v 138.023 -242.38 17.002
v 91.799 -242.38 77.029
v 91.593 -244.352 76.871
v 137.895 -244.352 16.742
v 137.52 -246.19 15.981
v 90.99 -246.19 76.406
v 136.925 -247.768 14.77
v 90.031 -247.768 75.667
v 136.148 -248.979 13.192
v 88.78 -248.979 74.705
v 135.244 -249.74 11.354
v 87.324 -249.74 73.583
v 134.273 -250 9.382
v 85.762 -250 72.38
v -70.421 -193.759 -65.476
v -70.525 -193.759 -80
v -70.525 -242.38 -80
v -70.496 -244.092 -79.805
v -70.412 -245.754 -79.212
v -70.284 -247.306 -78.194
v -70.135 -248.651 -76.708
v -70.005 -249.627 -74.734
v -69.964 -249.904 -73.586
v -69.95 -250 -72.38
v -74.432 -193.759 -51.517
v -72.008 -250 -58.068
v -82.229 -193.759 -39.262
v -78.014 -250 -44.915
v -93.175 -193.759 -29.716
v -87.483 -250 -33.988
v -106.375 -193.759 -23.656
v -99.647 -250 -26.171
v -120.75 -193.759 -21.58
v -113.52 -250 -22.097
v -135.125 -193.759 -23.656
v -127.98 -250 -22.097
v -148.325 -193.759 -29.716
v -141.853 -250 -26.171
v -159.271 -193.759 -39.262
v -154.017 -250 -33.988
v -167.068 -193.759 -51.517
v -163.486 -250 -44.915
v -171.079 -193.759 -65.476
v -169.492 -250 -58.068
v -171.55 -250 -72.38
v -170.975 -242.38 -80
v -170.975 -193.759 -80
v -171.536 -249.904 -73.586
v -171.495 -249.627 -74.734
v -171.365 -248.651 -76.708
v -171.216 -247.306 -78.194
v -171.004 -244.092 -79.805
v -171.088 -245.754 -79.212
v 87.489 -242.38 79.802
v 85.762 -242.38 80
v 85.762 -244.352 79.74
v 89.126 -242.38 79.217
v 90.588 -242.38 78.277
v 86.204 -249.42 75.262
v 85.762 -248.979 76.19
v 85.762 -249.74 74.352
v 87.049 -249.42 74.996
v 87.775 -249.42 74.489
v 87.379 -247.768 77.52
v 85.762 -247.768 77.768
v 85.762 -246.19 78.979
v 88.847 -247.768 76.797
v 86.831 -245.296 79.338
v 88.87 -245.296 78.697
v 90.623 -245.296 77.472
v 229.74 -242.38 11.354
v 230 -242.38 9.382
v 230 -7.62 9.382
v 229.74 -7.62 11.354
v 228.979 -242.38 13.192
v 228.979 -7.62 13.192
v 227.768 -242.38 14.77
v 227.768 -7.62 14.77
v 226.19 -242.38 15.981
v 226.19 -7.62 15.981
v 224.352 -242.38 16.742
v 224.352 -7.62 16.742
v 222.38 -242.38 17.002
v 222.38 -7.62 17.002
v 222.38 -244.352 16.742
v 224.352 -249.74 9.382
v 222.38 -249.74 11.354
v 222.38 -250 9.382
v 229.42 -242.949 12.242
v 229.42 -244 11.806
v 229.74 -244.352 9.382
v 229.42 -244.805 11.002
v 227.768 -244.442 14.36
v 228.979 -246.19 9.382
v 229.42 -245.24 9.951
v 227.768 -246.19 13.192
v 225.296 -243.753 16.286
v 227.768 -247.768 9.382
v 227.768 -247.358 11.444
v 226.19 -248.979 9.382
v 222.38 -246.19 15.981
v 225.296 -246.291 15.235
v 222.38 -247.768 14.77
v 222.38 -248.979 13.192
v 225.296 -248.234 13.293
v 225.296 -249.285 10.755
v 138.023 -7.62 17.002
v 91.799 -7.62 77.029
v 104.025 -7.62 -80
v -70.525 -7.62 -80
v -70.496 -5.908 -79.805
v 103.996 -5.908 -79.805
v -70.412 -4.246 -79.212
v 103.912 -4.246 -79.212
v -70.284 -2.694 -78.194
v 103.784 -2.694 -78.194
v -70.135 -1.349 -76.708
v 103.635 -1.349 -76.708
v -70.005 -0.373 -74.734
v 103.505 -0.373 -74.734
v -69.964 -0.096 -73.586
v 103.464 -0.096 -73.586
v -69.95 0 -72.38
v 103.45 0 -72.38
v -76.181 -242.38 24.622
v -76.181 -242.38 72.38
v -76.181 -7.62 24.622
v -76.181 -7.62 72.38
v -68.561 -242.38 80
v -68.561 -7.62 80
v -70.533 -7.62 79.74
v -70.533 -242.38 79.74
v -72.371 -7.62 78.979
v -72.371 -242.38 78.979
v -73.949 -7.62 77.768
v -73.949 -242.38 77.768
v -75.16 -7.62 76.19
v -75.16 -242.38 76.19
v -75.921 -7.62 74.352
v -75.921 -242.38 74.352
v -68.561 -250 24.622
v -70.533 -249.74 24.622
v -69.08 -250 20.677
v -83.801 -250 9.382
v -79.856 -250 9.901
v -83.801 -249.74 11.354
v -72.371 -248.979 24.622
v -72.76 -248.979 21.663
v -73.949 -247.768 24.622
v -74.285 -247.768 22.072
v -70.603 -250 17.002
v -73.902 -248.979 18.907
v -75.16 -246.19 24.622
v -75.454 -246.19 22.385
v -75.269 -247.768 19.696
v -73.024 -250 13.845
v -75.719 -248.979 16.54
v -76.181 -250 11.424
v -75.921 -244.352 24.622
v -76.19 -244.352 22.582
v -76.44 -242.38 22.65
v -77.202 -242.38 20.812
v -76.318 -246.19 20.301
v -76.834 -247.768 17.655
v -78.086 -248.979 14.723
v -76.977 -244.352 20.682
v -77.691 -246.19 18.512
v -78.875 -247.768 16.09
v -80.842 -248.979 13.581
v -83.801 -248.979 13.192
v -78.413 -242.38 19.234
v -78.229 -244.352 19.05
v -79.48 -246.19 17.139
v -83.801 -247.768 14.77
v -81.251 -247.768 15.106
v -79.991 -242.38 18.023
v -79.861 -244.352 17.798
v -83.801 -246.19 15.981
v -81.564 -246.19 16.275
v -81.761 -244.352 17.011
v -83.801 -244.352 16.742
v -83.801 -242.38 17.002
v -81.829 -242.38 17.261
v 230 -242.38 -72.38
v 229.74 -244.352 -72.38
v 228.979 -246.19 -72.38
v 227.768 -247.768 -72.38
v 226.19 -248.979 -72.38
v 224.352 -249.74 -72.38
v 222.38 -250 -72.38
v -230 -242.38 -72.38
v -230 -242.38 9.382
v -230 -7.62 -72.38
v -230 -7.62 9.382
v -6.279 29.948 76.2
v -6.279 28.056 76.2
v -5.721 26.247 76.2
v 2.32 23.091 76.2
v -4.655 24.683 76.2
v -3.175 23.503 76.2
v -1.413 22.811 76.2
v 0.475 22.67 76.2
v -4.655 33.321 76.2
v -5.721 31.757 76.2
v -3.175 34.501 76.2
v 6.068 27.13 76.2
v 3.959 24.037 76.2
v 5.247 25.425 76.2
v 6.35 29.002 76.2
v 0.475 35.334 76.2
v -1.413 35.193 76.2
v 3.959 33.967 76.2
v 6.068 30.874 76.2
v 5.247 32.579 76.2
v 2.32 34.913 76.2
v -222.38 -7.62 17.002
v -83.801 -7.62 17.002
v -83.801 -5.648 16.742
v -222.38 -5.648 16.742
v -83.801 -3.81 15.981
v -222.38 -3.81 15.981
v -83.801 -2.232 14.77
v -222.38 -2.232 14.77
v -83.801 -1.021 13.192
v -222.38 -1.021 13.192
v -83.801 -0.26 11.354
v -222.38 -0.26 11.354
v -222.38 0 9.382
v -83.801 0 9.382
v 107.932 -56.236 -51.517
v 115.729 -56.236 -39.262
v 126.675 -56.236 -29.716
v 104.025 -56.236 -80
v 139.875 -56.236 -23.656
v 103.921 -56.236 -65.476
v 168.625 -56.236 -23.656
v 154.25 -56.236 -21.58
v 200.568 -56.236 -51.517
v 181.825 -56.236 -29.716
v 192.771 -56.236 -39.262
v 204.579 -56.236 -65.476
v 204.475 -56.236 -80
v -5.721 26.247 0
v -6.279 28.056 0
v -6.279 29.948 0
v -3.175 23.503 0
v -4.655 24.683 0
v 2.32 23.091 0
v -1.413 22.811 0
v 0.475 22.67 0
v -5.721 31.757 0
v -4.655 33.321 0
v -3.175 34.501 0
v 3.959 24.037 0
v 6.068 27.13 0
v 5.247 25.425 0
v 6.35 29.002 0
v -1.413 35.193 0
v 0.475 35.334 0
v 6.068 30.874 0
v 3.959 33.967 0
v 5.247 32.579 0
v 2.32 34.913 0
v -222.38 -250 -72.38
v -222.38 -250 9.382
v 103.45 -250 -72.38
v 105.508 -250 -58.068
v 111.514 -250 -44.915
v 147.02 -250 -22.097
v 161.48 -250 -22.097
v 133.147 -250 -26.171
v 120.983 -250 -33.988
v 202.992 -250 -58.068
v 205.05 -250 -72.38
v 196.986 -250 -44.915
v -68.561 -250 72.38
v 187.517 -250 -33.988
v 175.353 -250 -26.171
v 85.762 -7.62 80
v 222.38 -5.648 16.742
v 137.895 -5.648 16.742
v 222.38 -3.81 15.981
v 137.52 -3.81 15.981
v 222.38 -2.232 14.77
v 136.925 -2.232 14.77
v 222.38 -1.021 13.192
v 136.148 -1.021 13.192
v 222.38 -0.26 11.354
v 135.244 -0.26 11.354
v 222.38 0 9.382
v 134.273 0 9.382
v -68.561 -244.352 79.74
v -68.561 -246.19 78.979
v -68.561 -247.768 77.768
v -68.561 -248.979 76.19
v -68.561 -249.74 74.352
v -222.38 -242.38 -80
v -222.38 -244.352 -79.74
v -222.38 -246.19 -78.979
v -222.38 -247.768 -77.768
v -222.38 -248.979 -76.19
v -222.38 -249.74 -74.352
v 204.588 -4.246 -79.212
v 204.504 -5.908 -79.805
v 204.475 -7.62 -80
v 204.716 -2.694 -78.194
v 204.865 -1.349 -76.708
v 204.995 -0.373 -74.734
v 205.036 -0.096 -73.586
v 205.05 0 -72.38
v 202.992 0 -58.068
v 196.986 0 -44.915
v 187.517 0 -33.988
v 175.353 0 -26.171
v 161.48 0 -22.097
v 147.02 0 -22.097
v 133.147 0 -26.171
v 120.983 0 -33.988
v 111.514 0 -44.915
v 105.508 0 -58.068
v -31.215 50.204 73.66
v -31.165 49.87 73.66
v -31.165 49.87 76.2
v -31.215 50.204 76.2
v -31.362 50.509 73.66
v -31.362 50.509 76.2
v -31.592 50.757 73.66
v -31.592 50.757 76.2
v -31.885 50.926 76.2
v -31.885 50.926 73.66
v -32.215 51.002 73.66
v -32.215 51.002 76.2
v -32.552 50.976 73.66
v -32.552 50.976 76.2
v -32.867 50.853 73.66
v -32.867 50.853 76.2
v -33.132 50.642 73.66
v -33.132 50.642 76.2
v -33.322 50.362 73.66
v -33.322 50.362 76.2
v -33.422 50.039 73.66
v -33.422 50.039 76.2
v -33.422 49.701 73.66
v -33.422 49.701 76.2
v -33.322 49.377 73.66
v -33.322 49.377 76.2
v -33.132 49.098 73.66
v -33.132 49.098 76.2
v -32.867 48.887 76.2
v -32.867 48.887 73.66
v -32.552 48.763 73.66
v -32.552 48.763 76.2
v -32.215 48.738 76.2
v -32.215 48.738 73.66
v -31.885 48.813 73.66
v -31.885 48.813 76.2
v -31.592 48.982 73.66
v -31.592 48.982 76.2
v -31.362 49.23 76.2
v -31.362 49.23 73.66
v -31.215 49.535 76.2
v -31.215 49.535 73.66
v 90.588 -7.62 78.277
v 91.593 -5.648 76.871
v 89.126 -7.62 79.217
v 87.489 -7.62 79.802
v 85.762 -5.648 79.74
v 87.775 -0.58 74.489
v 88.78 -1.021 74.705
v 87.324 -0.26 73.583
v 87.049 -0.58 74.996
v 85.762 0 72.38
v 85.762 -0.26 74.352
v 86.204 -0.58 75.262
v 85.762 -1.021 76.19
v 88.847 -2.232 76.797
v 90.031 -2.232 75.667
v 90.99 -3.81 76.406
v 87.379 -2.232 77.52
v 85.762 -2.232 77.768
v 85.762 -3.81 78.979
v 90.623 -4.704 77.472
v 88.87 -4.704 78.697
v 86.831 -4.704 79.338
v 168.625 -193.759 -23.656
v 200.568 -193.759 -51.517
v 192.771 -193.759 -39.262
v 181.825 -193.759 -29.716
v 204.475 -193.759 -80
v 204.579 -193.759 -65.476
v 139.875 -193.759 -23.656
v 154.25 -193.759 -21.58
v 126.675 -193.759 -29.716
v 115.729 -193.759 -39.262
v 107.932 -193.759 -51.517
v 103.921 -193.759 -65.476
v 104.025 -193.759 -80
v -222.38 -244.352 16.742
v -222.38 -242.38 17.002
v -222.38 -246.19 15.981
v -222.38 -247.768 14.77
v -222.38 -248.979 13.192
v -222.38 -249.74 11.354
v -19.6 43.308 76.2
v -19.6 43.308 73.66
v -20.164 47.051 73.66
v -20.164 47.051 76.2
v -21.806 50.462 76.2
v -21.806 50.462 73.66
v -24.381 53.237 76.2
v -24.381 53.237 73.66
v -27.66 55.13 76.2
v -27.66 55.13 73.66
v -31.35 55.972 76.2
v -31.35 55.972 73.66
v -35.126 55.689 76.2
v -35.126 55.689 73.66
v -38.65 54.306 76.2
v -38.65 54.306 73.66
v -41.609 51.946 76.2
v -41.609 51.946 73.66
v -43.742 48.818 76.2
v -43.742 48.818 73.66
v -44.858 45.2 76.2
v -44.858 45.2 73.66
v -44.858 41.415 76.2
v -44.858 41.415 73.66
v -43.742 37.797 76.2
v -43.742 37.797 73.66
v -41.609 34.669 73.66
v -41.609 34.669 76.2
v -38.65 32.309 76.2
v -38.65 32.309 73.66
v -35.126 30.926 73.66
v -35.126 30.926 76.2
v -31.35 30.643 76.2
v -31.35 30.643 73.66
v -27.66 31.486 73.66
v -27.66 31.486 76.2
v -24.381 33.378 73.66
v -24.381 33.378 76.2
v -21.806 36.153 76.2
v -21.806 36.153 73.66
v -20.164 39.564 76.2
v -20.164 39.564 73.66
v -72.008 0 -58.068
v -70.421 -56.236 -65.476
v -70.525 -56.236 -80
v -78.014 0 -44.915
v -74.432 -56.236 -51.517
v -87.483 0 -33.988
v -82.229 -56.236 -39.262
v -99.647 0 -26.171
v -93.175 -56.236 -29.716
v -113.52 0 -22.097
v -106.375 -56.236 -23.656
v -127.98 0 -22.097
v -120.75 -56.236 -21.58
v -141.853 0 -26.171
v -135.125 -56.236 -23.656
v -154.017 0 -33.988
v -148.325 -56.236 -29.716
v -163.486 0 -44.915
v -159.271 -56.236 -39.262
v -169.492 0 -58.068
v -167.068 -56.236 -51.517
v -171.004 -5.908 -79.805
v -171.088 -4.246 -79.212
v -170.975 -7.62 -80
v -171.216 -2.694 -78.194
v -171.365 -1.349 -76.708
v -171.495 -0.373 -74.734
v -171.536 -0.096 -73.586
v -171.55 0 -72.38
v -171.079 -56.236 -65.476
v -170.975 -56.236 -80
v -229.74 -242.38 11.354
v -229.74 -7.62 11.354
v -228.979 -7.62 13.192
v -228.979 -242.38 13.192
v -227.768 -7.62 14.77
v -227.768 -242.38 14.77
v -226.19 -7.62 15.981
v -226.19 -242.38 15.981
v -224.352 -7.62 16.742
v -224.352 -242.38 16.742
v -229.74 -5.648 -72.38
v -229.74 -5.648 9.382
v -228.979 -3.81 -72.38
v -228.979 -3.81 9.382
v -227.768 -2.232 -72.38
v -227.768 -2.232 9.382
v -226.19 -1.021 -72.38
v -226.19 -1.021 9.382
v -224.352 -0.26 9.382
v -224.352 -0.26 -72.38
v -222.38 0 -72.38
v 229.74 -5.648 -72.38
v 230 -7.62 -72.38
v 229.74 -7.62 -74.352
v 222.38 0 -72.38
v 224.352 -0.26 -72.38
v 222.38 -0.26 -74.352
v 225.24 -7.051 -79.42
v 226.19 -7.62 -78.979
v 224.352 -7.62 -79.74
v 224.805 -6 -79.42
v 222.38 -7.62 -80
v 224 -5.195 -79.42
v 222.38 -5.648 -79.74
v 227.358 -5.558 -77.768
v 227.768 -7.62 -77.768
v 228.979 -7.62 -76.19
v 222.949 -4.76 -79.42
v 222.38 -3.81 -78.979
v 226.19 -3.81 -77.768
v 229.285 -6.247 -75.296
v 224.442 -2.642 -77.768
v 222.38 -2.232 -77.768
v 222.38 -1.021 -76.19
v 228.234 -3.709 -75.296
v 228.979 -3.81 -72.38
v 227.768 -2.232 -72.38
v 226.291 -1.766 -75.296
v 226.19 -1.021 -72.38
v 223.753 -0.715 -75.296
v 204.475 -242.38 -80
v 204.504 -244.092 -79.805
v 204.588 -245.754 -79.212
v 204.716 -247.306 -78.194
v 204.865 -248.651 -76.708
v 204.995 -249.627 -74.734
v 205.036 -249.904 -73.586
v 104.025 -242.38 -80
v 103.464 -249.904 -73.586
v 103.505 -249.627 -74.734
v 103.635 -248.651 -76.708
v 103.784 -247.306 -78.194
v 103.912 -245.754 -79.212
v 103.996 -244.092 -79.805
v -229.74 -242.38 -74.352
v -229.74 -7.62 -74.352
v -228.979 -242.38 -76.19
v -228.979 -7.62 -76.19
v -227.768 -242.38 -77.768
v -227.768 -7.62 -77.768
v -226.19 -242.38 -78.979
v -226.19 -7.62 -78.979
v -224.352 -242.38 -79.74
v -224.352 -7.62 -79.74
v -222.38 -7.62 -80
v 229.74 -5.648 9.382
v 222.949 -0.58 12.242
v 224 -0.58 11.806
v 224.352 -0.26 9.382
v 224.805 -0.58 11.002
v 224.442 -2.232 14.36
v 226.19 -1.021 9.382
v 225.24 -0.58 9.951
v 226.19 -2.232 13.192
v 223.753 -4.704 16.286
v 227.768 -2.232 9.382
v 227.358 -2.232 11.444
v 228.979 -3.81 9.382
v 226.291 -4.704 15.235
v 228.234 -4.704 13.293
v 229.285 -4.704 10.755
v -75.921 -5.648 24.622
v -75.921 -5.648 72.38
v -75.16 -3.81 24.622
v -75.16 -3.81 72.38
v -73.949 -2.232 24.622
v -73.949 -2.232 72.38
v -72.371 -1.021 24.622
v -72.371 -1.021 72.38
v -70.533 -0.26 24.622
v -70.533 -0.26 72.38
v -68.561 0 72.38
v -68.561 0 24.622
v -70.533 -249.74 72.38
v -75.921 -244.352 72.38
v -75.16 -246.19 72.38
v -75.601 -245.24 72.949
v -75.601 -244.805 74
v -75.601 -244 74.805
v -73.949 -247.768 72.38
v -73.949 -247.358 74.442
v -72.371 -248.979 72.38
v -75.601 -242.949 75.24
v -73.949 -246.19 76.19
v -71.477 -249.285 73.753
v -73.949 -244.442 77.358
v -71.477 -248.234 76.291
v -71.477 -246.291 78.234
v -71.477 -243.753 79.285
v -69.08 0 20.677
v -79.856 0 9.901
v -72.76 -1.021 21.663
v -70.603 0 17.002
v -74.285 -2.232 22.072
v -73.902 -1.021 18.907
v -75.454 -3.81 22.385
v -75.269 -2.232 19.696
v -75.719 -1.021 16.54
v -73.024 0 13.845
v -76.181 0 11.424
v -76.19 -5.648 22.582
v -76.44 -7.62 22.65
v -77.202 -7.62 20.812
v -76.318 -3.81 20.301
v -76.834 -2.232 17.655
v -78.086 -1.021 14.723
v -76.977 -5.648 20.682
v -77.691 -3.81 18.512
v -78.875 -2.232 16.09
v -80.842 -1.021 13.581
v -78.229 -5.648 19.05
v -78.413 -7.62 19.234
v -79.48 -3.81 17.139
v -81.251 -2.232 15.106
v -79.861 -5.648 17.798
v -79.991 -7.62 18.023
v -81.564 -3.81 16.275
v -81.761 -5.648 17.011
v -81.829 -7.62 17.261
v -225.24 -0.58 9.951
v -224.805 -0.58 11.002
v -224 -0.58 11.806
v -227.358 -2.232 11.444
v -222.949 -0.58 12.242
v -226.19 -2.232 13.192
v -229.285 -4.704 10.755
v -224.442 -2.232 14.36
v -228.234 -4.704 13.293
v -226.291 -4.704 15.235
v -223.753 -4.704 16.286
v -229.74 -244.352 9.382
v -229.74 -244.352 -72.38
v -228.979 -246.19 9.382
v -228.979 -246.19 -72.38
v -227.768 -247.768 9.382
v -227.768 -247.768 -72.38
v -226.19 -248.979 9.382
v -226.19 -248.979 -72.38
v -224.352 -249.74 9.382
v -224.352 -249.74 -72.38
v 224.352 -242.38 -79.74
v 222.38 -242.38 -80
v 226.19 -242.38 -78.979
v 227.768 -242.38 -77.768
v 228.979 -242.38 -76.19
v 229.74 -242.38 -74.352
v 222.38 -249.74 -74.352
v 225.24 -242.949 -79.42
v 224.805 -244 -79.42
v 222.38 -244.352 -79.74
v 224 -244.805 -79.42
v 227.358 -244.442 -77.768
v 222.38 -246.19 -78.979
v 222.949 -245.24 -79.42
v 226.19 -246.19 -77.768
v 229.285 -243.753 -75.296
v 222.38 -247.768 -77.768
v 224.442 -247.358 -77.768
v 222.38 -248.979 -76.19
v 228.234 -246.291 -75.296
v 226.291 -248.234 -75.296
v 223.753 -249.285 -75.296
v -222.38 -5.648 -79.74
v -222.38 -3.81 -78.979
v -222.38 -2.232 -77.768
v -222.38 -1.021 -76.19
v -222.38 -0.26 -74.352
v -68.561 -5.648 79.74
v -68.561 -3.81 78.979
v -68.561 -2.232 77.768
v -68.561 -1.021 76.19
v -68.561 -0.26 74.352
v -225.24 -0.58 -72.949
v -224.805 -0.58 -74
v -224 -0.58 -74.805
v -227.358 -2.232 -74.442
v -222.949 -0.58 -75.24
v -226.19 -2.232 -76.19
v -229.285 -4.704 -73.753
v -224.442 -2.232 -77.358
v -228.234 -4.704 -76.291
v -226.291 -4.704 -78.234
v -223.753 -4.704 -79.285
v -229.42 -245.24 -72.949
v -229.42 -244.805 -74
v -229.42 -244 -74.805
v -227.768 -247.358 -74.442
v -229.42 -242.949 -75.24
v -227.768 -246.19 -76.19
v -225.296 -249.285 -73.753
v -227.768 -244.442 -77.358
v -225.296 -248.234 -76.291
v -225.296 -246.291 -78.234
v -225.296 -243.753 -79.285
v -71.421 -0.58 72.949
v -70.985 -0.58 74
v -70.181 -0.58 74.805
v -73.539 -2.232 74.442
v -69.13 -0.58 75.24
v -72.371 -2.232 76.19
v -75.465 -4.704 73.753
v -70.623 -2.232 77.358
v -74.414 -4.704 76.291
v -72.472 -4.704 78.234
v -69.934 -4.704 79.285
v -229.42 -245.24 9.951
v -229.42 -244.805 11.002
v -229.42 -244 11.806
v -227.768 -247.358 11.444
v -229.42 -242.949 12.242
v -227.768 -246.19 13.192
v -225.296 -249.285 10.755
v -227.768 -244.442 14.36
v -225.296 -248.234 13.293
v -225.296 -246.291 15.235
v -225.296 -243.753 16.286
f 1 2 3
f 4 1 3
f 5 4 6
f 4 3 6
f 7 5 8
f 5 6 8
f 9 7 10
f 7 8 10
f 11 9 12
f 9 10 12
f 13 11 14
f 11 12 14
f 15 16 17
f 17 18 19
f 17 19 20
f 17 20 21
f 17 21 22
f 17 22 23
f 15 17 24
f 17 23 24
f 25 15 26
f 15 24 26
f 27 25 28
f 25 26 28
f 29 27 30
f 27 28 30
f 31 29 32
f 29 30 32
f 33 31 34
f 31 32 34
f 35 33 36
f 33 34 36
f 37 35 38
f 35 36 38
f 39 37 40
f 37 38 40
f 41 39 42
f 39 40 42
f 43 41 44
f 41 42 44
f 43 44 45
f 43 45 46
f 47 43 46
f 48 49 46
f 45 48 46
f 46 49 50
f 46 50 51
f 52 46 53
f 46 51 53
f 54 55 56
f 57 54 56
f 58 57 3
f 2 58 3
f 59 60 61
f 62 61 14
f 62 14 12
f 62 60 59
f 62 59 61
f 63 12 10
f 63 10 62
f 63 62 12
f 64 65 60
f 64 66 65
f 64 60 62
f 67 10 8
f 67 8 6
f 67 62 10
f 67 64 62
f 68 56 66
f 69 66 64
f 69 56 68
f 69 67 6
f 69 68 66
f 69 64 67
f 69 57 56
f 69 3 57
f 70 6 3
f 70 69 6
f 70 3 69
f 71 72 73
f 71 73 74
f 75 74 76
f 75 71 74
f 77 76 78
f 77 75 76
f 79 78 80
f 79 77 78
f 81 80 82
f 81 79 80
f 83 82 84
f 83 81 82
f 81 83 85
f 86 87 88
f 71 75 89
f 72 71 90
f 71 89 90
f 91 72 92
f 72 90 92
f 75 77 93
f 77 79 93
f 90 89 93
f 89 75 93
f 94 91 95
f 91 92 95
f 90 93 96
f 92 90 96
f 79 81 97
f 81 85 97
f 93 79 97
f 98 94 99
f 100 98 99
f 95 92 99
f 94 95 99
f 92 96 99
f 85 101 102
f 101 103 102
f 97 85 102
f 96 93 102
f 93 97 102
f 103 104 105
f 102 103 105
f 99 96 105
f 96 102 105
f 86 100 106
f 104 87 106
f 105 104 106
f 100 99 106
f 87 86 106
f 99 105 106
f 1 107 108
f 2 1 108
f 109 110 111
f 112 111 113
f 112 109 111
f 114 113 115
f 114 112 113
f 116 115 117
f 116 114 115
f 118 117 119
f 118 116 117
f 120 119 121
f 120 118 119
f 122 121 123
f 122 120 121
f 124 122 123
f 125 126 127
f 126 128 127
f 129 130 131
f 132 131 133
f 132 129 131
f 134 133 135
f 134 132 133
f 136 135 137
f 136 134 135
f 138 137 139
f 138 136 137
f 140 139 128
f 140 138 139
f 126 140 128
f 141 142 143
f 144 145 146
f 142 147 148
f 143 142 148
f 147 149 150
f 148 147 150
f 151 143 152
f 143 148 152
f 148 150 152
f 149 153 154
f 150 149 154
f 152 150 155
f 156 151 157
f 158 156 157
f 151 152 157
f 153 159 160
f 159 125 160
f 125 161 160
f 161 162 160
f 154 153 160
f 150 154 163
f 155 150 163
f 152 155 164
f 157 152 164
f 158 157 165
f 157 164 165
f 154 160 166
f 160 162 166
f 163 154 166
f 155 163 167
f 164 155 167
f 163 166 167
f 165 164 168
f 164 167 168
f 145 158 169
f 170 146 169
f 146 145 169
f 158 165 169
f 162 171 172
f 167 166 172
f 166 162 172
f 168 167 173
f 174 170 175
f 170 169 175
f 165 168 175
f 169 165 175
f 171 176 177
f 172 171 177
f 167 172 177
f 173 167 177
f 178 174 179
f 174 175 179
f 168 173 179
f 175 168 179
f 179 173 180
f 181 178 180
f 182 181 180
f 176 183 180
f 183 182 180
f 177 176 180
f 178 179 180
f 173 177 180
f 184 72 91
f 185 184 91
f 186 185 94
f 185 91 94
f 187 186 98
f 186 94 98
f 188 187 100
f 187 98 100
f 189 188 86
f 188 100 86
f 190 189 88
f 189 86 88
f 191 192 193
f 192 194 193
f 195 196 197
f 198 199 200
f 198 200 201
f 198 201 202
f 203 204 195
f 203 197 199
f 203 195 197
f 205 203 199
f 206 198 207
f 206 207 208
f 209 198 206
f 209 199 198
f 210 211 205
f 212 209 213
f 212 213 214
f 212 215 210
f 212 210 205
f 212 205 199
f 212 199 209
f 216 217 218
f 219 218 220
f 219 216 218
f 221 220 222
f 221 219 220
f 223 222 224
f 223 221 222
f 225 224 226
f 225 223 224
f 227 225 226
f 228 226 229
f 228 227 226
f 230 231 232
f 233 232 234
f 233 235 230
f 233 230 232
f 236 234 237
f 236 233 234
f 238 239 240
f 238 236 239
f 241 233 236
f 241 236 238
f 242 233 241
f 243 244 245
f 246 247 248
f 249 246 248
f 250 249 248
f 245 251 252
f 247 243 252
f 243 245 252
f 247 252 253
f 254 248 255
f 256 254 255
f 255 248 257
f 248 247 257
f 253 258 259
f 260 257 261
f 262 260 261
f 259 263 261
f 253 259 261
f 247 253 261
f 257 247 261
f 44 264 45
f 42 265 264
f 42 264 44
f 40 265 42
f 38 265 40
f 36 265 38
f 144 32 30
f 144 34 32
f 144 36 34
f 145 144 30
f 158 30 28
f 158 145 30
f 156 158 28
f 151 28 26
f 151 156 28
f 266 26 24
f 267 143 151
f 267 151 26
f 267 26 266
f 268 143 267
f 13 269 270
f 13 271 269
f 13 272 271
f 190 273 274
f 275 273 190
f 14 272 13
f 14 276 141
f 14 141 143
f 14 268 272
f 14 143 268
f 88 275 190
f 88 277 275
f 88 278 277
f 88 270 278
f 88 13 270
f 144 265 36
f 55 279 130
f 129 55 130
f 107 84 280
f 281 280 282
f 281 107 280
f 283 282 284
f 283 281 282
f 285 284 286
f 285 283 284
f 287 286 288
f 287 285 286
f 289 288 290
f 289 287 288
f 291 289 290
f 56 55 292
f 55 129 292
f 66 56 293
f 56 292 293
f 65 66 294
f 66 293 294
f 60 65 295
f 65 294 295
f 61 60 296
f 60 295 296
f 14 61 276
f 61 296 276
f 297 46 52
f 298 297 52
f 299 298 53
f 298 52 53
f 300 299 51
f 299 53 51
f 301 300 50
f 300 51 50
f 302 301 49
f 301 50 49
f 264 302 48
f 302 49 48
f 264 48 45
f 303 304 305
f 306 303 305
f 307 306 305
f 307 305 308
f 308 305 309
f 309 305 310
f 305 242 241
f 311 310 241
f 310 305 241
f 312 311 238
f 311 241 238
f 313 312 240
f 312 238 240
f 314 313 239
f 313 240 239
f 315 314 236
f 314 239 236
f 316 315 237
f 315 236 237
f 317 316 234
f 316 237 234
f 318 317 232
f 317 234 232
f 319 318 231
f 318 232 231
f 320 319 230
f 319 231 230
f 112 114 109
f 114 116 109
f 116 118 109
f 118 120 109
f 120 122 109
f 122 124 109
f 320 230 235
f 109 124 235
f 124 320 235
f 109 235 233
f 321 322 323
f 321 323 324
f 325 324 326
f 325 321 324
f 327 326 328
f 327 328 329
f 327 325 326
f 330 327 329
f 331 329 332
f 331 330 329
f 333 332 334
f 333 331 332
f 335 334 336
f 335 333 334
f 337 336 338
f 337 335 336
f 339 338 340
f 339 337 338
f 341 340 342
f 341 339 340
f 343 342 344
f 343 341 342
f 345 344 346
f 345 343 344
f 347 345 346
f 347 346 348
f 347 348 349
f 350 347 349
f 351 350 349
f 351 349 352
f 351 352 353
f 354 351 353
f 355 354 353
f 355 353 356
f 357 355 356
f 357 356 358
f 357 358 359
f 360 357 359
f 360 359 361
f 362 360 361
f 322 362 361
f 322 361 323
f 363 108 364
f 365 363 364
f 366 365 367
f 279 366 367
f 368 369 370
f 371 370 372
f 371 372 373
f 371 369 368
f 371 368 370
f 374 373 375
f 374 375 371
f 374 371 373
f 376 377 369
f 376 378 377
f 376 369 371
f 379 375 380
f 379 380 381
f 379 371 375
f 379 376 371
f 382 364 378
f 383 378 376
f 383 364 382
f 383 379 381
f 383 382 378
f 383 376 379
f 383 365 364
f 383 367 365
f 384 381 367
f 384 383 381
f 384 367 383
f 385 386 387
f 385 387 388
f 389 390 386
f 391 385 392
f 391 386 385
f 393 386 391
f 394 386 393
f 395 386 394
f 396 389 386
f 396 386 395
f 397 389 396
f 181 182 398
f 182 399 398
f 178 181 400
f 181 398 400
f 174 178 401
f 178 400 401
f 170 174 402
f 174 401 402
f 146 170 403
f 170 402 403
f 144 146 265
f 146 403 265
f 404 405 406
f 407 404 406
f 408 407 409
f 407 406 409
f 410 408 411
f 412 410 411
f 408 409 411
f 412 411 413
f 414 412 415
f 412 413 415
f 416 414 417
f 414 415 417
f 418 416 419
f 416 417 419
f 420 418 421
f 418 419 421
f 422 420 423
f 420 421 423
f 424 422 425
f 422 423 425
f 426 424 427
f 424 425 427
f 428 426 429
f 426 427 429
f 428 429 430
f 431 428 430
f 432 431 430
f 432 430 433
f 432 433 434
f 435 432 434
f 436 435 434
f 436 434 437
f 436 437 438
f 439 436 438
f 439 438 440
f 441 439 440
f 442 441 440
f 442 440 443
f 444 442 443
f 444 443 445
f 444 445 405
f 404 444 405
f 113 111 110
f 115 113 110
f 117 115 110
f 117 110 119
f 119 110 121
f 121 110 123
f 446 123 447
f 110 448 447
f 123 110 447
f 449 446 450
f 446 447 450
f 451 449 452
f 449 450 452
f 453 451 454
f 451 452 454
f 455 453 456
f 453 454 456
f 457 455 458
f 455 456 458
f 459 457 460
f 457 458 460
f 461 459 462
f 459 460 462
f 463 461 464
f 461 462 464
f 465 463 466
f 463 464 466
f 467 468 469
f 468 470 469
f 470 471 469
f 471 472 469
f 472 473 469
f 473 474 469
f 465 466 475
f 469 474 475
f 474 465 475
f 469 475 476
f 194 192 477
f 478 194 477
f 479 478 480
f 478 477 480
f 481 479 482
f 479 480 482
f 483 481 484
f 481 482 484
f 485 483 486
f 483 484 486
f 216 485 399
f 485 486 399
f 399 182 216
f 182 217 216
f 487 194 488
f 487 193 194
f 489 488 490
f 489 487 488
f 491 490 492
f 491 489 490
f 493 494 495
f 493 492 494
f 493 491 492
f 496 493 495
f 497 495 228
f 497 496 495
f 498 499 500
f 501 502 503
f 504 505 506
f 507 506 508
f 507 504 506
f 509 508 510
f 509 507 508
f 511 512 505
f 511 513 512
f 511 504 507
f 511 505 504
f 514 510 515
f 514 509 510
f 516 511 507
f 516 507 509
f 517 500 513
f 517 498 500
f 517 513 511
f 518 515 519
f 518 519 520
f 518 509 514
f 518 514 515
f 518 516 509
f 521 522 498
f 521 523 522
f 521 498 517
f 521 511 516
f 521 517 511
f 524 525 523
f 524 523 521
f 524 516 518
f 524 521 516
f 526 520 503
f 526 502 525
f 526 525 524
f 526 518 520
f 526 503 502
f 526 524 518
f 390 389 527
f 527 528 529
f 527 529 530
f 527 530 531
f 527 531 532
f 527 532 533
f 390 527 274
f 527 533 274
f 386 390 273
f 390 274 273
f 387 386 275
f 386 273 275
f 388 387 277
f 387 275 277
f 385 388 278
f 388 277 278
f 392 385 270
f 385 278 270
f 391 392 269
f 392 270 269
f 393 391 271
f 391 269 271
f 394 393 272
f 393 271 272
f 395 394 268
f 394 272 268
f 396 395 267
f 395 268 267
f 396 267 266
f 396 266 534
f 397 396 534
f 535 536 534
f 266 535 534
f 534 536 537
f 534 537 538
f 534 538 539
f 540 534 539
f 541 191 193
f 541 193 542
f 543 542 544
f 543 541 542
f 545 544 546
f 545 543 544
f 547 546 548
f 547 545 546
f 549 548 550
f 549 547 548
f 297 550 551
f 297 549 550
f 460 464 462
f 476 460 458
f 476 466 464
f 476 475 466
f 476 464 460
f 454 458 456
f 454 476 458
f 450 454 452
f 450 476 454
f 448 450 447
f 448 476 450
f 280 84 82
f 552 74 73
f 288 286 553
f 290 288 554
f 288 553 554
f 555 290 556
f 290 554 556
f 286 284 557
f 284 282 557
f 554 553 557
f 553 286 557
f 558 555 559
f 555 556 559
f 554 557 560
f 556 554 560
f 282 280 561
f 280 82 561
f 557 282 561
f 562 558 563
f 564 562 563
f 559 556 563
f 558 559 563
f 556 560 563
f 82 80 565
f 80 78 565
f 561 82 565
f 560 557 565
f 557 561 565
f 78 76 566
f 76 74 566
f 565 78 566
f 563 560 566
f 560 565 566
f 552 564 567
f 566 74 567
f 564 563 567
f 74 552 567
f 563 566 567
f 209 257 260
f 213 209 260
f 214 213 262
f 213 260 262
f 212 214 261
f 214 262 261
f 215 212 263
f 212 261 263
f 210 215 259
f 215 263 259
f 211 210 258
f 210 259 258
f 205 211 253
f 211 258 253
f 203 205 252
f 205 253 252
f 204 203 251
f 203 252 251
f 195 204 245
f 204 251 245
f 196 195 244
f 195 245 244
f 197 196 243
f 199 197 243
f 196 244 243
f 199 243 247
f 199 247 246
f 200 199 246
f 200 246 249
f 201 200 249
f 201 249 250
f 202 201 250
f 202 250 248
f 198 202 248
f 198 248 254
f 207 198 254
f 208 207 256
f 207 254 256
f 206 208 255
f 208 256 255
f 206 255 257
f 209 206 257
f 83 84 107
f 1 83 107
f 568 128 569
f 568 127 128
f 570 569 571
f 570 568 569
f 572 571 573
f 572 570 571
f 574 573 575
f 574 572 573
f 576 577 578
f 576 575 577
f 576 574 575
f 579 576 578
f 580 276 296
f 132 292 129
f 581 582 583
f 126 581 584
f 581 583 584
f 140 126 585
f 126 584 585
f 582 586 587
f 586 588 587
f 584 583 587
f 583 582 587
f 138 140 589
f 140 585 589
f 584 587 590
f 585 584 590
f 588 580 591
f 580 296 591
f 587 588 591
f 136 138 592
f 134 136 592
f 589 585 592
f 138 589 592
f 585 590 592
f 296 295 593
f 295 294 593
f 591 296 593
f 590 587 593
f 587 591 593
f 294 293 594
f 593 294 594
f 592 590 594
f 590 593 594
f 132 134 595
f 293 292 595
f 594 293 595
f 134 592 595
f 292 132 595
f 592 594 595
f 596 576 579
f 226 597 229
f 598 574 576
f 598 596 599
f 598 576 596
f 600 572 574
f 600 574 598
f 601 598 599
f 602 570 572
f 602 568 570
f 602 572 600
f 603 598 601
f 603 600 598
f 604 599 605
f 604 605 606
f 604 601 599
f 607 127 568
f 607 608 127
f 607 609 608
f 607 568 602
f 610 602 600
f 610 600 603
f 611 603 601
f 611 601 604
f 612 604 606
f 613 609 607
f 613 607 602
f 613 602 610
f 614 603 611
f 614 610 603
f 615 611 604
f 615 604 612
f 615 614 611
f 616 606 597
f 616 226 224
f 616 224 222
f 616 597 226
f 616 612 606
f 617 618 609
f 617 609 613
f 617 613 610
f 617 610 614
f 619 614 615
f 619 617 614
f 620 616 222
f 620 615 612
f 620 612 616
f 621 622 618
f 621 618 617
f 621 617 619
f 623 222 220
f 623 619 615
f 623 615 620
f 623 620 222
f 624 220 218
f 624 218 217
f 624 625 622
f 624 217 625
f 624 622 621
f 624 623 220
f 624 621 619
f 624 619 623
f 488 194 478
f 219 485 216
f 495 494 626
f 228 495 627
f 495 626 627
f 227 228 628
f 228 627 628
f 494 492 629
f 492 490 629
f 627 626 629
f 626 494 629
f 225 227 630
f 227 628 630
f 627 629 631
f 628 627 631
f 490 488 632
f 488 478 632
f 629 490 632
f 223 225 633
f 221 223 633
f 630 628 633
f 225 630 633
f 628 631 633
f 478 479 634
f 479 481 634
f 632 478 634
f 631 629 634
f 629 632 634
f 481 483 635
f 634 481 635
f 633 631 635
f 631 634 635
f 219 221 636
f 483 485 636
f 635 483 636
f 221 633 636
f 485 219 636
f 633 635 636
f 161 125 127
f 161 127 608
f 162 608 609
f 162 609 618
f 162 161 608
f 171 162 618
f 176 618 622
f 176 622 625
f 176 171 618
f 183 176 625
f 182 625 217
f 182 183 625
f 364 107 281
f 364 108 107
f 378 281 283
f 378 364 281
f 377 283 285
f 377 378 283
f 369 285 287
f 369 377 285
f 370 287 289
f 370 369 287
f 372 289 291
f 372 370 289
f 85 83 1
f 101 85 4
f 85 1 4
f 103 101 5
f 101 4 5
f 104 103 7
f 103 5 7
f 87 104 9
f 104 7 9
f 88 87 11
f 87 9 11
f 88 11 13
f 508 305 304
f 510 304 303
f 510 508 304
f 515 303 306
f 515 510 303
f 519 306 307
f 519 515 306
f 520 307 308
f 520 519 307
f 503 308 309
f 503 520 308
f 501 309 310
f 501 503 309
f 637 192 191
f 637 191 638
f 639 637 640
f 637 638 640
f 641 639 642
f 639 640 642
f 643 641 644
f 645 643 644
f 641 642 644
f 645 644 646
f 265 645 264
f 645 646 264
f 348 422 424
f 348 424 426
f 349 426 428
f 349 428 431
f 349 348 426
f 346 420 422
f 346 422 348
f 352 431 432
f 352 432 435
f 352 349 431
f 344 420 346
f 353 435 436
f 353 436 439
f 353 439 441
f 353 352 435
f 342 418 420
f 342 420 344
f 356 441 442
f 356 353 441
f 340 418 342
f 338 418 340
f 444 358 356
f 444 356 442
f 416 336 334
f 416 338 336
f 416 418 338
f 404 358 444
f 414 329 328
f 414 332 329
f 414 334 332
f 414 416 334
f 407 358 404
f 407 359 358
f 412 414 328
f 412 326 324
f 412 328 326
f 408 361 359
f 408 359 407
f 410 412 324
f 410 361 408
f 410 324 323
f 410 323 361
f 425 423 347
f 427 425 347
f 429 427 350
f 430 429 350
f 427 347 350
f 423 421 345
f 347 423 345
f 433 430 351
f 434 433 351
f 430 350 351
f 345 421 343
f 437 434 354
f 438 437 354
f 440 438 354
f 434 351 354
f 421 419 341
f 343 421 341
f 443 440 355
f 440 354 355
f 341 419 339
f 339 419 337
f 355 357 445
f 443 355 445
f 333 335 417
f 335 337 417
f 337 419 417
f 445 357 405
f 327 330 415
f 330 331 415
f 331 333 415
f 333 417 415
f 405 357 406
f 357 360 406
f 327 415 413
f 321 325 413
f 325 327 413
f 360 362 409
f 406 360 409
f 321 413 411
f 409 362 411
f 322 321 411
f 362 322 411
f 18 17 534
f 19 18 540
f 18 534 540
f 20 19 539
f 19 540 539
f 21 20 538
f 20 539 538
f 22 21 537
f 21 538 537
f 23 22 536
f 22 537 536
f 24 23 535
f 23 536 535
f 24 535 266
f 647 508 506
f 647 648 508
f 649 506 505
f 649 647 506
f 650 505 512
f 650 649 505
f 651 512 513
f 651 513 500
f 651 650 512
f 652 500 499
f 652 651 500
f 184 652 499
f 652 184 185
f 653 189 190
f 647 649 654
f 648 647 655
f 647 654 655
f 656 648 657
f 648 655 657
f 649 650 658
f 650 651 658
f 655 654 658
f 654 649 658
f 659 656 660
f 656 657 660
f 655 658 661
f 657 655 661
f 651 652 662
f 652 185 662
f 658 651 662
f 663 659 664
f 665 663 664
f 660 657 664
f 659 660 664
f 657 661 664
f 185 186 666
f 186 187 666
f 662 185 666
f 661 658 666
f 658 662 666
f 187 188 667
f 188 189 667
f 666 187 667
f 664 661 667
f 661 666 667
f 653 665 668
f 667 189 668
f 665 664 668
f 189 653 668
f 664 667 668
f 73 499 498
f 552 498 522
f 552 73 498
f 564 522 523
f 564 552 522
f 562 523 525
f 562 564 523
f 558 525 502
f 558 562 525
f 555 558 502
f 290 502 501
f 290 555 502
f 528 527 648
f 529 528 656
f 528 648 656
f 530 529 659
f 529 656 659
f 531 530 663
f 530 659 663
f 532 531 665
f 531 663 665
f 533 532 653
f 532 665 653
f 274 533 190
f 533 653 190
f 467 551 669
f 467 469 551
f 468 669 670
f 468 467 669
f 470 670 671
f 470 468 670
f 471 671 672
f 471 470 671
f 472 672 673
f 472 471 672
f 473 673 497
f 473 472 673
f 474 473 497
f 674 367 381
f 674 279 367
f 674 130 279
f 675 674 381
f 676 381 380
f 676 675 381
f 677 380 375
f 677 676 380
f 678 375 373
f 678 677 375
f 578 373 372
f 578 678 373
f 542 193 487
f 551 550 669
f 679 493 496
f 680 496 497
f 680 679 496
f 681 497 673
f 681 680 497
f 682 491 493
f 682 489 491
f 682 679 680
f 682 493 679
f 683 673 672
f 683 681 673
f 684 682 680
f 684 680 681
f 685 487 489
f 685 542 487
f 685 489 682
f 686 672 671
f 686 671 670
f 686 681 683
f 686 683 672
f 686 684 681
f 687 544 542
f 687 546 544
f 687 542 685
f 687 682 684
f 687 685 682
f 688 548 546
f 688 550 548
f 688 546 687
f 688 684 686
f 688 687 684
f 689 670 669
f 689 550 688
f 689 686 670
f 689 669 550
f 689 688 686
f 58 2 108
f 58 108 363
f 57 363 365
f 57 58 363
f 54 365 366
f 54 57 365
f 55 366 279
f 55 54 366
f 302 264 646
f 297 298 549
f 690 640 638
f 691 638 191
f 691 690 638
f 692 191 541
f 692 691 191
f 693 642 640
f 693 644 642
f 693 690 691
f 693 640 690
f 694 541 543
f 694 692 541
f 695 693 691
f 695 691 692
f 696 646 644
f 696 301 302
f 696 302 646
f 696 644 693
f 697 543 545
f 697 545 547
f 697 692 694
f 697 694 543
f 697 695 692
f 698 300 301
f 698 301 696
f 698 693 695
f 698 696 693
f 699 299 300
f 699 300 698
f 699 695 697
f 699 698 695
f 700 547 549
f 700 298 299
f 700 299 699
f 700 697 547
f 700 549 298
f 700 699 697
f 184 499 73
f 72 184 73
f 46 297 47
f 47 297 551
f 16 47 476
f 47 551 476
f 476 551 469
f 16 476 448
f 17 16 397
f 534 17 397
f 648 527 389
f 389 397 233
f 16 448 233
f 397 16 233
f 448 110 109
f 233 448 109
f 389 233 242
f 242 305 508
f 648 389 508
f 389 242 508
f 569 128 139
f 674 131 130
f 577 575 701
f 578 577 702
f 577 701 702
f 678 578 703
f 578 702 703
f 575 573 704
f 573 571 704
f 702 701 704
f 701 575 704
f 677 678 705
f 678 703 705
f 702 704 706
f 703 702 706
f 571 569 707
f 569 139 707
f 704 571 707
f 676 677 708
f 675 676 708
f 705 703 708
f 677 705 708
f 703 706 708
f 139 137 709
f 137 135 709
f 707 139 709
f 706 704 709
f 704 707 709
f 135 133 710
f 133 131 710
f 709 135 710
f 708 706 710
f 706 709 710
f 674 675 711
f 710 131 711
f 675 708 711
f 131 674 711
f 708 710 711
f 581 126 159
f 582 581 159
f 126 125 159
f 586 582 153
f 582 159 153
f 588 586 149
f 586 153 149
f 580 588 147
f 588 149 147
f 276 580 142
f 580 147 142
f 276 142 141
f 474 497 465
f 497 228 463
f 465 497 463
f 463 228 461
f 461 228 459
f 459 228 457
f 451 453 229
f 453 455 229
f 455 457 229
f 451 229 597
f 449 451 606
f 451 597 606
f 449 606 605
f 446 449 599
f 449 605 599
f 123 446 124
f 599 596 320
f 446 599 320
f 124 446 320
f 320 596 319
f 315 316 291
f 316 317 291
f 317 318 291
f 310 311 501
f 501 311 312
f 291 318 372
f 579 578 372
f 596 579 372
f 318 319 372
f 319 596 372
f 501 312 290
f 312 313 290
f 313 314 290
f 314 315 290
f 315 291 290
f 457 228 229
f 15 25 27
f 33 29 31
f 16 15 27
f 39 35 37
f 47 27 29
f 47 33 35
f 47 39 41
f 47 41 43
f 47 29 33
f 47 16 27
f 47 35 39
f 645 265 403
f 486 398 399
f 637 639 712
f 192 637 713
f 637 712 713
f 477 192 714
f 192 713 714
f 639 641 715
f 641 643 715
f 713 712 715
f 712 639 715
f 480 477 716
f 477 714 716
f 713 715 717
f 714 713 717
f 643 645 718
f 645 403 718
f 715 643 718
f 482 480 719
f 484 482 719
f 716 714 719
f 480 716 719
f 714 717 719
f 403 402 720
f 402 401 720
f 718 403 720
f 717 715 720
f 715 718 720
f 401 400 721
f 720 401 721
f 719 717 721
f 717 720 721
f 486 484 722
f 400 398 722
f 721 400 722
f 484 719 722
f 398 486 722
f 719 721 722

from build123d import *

# Parameters (mm, degrees)
F1_DEPTH = 250
F2_R     = 7.62
F4_DEPTH = 259.08
F5_W     = 143.2349812942
F5_H     = 137.5237668699
F5_W_2   = 109.7349864202
F5_W_3   = 174.5495027389
F6_DEPTH = 88.9
F7_R     = 6.35
F8_DEPTH = 76.2
F7_R_2   = 12.7
F7_R_3   = 1.1349906825
F9_DEPTH = 73.66


with BuildPart() as f1:
    # F0 (on Front) → F1 (new body)
    with BuildSketch(Plane.XZ):
        Polygon((-230, 17.0017518103), (-230, -80), (230, -80), (230, 17.0017518103), (138.0227927625, 17.0017518103), (89.5114019513, 80), (-76.1807560921, 80), (-76.1807560921, 17.0017518103), align=None)
    extrude(amount=F1_DEPTH)

    # F2
    f2_edges = [f1.edges().sort_by_distance(p)[0] for p in [
        (184.011396, -250, 17.001752),
        (230, -125, 17.001752),
        (230, -250, -31.499124),
        (113.767097, -250, 48.500876),
        (89.511402, -125, 80),
        (184.011396, 0, 17.001752),
        (113.767097, 0, 48.500876),
        (230, 0, -31.499124),
        (230, -125, -80),
        (0, -250, -80),
        (6.665323, -250, 80),
        (-76.180756, -250, 48.500876),
        (-153.090378, -250, 17.001752),
        (-230, -250, -31.499124),
        (-76.180756, -125, 80),
        (-76.180756, -125, 17.001752),
        (-76.180756, 0, 48.500876),
        (-230, -125, 17.001752),
        (-230, -125, -80),
        (-230, 0, -31.499124),
        (6.665323, 0, 80),
        (-153.090378, 0, 17.001752),
        (0, 0, -80),
    ]]
    fillet(f2_edges, radius=F2_R)

    # F3 (on face) → F4 (cut)
    with BuildSketch(Plane.XZ.offset(250)):
        with BuildLine():
            Line((-171.550002563, -72.38), (-69.950002563, -72.38))
            ThreePointArc((-69.950002563, -72.38), (-120.750002563, -21.58), (-171.550002563, -72.38))
        make_face()
        with BuildLine():
            ThreePointArc((-171.550002563, -72.38), (-120.750002563, -123.18), (-69.950002563, -72.38))
            Line((-69.950002563, -72.38), (-171.550002563, -72.38))
        make_face()
        with BuildLine():
            ThreePointArc((103.449997437, -72.38), (154.249997437, -123.18), (205.049997437, -72.38))
            Line((205.049997437, -72.38), (103.449997437, -72.38))
        make_face()
        with BuildLine():
            Line((103.449997437, -72.38), (205.049997437, -72.38))
            ThreePointArc((205.049997437, -72.38), (154.249997437, -21.58), (103.449997437, -72.38))
        make_face()
    extrude(amount=-F4_DEPTH, mode=Mode.SUBTRACT)

    # F5 (on face) → F6 (join)
    with BuildSketch(Plane(origin=(0, 0, -80), x_dir=(1, 0, 0), z_dir=(0, 0, -1))):
        with Locations((-142.1422445795, 124.997483435)):
            Rectangle(F5_W, F5_H)
        with Locations((158.8922420165, 124.997483435)):
            Rectangle(F5_W_2, F5_H)
        with Locations((16.749997437, 124.997483435)):
            Rectangle(F5_W_3, F5_H)
    extrude(amount=-F6_DEPTH)


with BuildPart() as f8:
    # F7 (on Top) → F8 (new body)
    with BuildSketch(Plane.XY):
        with Locations((0, 29.0019685285)):
            Circle(F7_R)
    extrude(amount=F8_DEPTH)


with BuildPart() as f8b:
    # F7 (on Top) → F8, piece 2 (new body)
    with BuildSketch(Plane.XY):
        with Locations((-32.2995707393, 43.3076322079)):
            Circle(F7_R_2)
        with Locations((-32.2995707393, 49.8697608709)):
            Circle(F7_R_3, mode=Mode.SUBTRACT)
    extrude(amount=F8_DEPTH)

    # F9 (cut): a face of the model
    f9_faces = [f8b.faces().sort_by_distance(p)[0] for p in [
        (-32.2995707393, 43.2547993047, 0),
    ]]
    extrude(f9_faces, amount=-F9_DEPTH, mode=Mode.SUBTRACT)


solid = Compound([f1.part, f8.part, f8b.part])
